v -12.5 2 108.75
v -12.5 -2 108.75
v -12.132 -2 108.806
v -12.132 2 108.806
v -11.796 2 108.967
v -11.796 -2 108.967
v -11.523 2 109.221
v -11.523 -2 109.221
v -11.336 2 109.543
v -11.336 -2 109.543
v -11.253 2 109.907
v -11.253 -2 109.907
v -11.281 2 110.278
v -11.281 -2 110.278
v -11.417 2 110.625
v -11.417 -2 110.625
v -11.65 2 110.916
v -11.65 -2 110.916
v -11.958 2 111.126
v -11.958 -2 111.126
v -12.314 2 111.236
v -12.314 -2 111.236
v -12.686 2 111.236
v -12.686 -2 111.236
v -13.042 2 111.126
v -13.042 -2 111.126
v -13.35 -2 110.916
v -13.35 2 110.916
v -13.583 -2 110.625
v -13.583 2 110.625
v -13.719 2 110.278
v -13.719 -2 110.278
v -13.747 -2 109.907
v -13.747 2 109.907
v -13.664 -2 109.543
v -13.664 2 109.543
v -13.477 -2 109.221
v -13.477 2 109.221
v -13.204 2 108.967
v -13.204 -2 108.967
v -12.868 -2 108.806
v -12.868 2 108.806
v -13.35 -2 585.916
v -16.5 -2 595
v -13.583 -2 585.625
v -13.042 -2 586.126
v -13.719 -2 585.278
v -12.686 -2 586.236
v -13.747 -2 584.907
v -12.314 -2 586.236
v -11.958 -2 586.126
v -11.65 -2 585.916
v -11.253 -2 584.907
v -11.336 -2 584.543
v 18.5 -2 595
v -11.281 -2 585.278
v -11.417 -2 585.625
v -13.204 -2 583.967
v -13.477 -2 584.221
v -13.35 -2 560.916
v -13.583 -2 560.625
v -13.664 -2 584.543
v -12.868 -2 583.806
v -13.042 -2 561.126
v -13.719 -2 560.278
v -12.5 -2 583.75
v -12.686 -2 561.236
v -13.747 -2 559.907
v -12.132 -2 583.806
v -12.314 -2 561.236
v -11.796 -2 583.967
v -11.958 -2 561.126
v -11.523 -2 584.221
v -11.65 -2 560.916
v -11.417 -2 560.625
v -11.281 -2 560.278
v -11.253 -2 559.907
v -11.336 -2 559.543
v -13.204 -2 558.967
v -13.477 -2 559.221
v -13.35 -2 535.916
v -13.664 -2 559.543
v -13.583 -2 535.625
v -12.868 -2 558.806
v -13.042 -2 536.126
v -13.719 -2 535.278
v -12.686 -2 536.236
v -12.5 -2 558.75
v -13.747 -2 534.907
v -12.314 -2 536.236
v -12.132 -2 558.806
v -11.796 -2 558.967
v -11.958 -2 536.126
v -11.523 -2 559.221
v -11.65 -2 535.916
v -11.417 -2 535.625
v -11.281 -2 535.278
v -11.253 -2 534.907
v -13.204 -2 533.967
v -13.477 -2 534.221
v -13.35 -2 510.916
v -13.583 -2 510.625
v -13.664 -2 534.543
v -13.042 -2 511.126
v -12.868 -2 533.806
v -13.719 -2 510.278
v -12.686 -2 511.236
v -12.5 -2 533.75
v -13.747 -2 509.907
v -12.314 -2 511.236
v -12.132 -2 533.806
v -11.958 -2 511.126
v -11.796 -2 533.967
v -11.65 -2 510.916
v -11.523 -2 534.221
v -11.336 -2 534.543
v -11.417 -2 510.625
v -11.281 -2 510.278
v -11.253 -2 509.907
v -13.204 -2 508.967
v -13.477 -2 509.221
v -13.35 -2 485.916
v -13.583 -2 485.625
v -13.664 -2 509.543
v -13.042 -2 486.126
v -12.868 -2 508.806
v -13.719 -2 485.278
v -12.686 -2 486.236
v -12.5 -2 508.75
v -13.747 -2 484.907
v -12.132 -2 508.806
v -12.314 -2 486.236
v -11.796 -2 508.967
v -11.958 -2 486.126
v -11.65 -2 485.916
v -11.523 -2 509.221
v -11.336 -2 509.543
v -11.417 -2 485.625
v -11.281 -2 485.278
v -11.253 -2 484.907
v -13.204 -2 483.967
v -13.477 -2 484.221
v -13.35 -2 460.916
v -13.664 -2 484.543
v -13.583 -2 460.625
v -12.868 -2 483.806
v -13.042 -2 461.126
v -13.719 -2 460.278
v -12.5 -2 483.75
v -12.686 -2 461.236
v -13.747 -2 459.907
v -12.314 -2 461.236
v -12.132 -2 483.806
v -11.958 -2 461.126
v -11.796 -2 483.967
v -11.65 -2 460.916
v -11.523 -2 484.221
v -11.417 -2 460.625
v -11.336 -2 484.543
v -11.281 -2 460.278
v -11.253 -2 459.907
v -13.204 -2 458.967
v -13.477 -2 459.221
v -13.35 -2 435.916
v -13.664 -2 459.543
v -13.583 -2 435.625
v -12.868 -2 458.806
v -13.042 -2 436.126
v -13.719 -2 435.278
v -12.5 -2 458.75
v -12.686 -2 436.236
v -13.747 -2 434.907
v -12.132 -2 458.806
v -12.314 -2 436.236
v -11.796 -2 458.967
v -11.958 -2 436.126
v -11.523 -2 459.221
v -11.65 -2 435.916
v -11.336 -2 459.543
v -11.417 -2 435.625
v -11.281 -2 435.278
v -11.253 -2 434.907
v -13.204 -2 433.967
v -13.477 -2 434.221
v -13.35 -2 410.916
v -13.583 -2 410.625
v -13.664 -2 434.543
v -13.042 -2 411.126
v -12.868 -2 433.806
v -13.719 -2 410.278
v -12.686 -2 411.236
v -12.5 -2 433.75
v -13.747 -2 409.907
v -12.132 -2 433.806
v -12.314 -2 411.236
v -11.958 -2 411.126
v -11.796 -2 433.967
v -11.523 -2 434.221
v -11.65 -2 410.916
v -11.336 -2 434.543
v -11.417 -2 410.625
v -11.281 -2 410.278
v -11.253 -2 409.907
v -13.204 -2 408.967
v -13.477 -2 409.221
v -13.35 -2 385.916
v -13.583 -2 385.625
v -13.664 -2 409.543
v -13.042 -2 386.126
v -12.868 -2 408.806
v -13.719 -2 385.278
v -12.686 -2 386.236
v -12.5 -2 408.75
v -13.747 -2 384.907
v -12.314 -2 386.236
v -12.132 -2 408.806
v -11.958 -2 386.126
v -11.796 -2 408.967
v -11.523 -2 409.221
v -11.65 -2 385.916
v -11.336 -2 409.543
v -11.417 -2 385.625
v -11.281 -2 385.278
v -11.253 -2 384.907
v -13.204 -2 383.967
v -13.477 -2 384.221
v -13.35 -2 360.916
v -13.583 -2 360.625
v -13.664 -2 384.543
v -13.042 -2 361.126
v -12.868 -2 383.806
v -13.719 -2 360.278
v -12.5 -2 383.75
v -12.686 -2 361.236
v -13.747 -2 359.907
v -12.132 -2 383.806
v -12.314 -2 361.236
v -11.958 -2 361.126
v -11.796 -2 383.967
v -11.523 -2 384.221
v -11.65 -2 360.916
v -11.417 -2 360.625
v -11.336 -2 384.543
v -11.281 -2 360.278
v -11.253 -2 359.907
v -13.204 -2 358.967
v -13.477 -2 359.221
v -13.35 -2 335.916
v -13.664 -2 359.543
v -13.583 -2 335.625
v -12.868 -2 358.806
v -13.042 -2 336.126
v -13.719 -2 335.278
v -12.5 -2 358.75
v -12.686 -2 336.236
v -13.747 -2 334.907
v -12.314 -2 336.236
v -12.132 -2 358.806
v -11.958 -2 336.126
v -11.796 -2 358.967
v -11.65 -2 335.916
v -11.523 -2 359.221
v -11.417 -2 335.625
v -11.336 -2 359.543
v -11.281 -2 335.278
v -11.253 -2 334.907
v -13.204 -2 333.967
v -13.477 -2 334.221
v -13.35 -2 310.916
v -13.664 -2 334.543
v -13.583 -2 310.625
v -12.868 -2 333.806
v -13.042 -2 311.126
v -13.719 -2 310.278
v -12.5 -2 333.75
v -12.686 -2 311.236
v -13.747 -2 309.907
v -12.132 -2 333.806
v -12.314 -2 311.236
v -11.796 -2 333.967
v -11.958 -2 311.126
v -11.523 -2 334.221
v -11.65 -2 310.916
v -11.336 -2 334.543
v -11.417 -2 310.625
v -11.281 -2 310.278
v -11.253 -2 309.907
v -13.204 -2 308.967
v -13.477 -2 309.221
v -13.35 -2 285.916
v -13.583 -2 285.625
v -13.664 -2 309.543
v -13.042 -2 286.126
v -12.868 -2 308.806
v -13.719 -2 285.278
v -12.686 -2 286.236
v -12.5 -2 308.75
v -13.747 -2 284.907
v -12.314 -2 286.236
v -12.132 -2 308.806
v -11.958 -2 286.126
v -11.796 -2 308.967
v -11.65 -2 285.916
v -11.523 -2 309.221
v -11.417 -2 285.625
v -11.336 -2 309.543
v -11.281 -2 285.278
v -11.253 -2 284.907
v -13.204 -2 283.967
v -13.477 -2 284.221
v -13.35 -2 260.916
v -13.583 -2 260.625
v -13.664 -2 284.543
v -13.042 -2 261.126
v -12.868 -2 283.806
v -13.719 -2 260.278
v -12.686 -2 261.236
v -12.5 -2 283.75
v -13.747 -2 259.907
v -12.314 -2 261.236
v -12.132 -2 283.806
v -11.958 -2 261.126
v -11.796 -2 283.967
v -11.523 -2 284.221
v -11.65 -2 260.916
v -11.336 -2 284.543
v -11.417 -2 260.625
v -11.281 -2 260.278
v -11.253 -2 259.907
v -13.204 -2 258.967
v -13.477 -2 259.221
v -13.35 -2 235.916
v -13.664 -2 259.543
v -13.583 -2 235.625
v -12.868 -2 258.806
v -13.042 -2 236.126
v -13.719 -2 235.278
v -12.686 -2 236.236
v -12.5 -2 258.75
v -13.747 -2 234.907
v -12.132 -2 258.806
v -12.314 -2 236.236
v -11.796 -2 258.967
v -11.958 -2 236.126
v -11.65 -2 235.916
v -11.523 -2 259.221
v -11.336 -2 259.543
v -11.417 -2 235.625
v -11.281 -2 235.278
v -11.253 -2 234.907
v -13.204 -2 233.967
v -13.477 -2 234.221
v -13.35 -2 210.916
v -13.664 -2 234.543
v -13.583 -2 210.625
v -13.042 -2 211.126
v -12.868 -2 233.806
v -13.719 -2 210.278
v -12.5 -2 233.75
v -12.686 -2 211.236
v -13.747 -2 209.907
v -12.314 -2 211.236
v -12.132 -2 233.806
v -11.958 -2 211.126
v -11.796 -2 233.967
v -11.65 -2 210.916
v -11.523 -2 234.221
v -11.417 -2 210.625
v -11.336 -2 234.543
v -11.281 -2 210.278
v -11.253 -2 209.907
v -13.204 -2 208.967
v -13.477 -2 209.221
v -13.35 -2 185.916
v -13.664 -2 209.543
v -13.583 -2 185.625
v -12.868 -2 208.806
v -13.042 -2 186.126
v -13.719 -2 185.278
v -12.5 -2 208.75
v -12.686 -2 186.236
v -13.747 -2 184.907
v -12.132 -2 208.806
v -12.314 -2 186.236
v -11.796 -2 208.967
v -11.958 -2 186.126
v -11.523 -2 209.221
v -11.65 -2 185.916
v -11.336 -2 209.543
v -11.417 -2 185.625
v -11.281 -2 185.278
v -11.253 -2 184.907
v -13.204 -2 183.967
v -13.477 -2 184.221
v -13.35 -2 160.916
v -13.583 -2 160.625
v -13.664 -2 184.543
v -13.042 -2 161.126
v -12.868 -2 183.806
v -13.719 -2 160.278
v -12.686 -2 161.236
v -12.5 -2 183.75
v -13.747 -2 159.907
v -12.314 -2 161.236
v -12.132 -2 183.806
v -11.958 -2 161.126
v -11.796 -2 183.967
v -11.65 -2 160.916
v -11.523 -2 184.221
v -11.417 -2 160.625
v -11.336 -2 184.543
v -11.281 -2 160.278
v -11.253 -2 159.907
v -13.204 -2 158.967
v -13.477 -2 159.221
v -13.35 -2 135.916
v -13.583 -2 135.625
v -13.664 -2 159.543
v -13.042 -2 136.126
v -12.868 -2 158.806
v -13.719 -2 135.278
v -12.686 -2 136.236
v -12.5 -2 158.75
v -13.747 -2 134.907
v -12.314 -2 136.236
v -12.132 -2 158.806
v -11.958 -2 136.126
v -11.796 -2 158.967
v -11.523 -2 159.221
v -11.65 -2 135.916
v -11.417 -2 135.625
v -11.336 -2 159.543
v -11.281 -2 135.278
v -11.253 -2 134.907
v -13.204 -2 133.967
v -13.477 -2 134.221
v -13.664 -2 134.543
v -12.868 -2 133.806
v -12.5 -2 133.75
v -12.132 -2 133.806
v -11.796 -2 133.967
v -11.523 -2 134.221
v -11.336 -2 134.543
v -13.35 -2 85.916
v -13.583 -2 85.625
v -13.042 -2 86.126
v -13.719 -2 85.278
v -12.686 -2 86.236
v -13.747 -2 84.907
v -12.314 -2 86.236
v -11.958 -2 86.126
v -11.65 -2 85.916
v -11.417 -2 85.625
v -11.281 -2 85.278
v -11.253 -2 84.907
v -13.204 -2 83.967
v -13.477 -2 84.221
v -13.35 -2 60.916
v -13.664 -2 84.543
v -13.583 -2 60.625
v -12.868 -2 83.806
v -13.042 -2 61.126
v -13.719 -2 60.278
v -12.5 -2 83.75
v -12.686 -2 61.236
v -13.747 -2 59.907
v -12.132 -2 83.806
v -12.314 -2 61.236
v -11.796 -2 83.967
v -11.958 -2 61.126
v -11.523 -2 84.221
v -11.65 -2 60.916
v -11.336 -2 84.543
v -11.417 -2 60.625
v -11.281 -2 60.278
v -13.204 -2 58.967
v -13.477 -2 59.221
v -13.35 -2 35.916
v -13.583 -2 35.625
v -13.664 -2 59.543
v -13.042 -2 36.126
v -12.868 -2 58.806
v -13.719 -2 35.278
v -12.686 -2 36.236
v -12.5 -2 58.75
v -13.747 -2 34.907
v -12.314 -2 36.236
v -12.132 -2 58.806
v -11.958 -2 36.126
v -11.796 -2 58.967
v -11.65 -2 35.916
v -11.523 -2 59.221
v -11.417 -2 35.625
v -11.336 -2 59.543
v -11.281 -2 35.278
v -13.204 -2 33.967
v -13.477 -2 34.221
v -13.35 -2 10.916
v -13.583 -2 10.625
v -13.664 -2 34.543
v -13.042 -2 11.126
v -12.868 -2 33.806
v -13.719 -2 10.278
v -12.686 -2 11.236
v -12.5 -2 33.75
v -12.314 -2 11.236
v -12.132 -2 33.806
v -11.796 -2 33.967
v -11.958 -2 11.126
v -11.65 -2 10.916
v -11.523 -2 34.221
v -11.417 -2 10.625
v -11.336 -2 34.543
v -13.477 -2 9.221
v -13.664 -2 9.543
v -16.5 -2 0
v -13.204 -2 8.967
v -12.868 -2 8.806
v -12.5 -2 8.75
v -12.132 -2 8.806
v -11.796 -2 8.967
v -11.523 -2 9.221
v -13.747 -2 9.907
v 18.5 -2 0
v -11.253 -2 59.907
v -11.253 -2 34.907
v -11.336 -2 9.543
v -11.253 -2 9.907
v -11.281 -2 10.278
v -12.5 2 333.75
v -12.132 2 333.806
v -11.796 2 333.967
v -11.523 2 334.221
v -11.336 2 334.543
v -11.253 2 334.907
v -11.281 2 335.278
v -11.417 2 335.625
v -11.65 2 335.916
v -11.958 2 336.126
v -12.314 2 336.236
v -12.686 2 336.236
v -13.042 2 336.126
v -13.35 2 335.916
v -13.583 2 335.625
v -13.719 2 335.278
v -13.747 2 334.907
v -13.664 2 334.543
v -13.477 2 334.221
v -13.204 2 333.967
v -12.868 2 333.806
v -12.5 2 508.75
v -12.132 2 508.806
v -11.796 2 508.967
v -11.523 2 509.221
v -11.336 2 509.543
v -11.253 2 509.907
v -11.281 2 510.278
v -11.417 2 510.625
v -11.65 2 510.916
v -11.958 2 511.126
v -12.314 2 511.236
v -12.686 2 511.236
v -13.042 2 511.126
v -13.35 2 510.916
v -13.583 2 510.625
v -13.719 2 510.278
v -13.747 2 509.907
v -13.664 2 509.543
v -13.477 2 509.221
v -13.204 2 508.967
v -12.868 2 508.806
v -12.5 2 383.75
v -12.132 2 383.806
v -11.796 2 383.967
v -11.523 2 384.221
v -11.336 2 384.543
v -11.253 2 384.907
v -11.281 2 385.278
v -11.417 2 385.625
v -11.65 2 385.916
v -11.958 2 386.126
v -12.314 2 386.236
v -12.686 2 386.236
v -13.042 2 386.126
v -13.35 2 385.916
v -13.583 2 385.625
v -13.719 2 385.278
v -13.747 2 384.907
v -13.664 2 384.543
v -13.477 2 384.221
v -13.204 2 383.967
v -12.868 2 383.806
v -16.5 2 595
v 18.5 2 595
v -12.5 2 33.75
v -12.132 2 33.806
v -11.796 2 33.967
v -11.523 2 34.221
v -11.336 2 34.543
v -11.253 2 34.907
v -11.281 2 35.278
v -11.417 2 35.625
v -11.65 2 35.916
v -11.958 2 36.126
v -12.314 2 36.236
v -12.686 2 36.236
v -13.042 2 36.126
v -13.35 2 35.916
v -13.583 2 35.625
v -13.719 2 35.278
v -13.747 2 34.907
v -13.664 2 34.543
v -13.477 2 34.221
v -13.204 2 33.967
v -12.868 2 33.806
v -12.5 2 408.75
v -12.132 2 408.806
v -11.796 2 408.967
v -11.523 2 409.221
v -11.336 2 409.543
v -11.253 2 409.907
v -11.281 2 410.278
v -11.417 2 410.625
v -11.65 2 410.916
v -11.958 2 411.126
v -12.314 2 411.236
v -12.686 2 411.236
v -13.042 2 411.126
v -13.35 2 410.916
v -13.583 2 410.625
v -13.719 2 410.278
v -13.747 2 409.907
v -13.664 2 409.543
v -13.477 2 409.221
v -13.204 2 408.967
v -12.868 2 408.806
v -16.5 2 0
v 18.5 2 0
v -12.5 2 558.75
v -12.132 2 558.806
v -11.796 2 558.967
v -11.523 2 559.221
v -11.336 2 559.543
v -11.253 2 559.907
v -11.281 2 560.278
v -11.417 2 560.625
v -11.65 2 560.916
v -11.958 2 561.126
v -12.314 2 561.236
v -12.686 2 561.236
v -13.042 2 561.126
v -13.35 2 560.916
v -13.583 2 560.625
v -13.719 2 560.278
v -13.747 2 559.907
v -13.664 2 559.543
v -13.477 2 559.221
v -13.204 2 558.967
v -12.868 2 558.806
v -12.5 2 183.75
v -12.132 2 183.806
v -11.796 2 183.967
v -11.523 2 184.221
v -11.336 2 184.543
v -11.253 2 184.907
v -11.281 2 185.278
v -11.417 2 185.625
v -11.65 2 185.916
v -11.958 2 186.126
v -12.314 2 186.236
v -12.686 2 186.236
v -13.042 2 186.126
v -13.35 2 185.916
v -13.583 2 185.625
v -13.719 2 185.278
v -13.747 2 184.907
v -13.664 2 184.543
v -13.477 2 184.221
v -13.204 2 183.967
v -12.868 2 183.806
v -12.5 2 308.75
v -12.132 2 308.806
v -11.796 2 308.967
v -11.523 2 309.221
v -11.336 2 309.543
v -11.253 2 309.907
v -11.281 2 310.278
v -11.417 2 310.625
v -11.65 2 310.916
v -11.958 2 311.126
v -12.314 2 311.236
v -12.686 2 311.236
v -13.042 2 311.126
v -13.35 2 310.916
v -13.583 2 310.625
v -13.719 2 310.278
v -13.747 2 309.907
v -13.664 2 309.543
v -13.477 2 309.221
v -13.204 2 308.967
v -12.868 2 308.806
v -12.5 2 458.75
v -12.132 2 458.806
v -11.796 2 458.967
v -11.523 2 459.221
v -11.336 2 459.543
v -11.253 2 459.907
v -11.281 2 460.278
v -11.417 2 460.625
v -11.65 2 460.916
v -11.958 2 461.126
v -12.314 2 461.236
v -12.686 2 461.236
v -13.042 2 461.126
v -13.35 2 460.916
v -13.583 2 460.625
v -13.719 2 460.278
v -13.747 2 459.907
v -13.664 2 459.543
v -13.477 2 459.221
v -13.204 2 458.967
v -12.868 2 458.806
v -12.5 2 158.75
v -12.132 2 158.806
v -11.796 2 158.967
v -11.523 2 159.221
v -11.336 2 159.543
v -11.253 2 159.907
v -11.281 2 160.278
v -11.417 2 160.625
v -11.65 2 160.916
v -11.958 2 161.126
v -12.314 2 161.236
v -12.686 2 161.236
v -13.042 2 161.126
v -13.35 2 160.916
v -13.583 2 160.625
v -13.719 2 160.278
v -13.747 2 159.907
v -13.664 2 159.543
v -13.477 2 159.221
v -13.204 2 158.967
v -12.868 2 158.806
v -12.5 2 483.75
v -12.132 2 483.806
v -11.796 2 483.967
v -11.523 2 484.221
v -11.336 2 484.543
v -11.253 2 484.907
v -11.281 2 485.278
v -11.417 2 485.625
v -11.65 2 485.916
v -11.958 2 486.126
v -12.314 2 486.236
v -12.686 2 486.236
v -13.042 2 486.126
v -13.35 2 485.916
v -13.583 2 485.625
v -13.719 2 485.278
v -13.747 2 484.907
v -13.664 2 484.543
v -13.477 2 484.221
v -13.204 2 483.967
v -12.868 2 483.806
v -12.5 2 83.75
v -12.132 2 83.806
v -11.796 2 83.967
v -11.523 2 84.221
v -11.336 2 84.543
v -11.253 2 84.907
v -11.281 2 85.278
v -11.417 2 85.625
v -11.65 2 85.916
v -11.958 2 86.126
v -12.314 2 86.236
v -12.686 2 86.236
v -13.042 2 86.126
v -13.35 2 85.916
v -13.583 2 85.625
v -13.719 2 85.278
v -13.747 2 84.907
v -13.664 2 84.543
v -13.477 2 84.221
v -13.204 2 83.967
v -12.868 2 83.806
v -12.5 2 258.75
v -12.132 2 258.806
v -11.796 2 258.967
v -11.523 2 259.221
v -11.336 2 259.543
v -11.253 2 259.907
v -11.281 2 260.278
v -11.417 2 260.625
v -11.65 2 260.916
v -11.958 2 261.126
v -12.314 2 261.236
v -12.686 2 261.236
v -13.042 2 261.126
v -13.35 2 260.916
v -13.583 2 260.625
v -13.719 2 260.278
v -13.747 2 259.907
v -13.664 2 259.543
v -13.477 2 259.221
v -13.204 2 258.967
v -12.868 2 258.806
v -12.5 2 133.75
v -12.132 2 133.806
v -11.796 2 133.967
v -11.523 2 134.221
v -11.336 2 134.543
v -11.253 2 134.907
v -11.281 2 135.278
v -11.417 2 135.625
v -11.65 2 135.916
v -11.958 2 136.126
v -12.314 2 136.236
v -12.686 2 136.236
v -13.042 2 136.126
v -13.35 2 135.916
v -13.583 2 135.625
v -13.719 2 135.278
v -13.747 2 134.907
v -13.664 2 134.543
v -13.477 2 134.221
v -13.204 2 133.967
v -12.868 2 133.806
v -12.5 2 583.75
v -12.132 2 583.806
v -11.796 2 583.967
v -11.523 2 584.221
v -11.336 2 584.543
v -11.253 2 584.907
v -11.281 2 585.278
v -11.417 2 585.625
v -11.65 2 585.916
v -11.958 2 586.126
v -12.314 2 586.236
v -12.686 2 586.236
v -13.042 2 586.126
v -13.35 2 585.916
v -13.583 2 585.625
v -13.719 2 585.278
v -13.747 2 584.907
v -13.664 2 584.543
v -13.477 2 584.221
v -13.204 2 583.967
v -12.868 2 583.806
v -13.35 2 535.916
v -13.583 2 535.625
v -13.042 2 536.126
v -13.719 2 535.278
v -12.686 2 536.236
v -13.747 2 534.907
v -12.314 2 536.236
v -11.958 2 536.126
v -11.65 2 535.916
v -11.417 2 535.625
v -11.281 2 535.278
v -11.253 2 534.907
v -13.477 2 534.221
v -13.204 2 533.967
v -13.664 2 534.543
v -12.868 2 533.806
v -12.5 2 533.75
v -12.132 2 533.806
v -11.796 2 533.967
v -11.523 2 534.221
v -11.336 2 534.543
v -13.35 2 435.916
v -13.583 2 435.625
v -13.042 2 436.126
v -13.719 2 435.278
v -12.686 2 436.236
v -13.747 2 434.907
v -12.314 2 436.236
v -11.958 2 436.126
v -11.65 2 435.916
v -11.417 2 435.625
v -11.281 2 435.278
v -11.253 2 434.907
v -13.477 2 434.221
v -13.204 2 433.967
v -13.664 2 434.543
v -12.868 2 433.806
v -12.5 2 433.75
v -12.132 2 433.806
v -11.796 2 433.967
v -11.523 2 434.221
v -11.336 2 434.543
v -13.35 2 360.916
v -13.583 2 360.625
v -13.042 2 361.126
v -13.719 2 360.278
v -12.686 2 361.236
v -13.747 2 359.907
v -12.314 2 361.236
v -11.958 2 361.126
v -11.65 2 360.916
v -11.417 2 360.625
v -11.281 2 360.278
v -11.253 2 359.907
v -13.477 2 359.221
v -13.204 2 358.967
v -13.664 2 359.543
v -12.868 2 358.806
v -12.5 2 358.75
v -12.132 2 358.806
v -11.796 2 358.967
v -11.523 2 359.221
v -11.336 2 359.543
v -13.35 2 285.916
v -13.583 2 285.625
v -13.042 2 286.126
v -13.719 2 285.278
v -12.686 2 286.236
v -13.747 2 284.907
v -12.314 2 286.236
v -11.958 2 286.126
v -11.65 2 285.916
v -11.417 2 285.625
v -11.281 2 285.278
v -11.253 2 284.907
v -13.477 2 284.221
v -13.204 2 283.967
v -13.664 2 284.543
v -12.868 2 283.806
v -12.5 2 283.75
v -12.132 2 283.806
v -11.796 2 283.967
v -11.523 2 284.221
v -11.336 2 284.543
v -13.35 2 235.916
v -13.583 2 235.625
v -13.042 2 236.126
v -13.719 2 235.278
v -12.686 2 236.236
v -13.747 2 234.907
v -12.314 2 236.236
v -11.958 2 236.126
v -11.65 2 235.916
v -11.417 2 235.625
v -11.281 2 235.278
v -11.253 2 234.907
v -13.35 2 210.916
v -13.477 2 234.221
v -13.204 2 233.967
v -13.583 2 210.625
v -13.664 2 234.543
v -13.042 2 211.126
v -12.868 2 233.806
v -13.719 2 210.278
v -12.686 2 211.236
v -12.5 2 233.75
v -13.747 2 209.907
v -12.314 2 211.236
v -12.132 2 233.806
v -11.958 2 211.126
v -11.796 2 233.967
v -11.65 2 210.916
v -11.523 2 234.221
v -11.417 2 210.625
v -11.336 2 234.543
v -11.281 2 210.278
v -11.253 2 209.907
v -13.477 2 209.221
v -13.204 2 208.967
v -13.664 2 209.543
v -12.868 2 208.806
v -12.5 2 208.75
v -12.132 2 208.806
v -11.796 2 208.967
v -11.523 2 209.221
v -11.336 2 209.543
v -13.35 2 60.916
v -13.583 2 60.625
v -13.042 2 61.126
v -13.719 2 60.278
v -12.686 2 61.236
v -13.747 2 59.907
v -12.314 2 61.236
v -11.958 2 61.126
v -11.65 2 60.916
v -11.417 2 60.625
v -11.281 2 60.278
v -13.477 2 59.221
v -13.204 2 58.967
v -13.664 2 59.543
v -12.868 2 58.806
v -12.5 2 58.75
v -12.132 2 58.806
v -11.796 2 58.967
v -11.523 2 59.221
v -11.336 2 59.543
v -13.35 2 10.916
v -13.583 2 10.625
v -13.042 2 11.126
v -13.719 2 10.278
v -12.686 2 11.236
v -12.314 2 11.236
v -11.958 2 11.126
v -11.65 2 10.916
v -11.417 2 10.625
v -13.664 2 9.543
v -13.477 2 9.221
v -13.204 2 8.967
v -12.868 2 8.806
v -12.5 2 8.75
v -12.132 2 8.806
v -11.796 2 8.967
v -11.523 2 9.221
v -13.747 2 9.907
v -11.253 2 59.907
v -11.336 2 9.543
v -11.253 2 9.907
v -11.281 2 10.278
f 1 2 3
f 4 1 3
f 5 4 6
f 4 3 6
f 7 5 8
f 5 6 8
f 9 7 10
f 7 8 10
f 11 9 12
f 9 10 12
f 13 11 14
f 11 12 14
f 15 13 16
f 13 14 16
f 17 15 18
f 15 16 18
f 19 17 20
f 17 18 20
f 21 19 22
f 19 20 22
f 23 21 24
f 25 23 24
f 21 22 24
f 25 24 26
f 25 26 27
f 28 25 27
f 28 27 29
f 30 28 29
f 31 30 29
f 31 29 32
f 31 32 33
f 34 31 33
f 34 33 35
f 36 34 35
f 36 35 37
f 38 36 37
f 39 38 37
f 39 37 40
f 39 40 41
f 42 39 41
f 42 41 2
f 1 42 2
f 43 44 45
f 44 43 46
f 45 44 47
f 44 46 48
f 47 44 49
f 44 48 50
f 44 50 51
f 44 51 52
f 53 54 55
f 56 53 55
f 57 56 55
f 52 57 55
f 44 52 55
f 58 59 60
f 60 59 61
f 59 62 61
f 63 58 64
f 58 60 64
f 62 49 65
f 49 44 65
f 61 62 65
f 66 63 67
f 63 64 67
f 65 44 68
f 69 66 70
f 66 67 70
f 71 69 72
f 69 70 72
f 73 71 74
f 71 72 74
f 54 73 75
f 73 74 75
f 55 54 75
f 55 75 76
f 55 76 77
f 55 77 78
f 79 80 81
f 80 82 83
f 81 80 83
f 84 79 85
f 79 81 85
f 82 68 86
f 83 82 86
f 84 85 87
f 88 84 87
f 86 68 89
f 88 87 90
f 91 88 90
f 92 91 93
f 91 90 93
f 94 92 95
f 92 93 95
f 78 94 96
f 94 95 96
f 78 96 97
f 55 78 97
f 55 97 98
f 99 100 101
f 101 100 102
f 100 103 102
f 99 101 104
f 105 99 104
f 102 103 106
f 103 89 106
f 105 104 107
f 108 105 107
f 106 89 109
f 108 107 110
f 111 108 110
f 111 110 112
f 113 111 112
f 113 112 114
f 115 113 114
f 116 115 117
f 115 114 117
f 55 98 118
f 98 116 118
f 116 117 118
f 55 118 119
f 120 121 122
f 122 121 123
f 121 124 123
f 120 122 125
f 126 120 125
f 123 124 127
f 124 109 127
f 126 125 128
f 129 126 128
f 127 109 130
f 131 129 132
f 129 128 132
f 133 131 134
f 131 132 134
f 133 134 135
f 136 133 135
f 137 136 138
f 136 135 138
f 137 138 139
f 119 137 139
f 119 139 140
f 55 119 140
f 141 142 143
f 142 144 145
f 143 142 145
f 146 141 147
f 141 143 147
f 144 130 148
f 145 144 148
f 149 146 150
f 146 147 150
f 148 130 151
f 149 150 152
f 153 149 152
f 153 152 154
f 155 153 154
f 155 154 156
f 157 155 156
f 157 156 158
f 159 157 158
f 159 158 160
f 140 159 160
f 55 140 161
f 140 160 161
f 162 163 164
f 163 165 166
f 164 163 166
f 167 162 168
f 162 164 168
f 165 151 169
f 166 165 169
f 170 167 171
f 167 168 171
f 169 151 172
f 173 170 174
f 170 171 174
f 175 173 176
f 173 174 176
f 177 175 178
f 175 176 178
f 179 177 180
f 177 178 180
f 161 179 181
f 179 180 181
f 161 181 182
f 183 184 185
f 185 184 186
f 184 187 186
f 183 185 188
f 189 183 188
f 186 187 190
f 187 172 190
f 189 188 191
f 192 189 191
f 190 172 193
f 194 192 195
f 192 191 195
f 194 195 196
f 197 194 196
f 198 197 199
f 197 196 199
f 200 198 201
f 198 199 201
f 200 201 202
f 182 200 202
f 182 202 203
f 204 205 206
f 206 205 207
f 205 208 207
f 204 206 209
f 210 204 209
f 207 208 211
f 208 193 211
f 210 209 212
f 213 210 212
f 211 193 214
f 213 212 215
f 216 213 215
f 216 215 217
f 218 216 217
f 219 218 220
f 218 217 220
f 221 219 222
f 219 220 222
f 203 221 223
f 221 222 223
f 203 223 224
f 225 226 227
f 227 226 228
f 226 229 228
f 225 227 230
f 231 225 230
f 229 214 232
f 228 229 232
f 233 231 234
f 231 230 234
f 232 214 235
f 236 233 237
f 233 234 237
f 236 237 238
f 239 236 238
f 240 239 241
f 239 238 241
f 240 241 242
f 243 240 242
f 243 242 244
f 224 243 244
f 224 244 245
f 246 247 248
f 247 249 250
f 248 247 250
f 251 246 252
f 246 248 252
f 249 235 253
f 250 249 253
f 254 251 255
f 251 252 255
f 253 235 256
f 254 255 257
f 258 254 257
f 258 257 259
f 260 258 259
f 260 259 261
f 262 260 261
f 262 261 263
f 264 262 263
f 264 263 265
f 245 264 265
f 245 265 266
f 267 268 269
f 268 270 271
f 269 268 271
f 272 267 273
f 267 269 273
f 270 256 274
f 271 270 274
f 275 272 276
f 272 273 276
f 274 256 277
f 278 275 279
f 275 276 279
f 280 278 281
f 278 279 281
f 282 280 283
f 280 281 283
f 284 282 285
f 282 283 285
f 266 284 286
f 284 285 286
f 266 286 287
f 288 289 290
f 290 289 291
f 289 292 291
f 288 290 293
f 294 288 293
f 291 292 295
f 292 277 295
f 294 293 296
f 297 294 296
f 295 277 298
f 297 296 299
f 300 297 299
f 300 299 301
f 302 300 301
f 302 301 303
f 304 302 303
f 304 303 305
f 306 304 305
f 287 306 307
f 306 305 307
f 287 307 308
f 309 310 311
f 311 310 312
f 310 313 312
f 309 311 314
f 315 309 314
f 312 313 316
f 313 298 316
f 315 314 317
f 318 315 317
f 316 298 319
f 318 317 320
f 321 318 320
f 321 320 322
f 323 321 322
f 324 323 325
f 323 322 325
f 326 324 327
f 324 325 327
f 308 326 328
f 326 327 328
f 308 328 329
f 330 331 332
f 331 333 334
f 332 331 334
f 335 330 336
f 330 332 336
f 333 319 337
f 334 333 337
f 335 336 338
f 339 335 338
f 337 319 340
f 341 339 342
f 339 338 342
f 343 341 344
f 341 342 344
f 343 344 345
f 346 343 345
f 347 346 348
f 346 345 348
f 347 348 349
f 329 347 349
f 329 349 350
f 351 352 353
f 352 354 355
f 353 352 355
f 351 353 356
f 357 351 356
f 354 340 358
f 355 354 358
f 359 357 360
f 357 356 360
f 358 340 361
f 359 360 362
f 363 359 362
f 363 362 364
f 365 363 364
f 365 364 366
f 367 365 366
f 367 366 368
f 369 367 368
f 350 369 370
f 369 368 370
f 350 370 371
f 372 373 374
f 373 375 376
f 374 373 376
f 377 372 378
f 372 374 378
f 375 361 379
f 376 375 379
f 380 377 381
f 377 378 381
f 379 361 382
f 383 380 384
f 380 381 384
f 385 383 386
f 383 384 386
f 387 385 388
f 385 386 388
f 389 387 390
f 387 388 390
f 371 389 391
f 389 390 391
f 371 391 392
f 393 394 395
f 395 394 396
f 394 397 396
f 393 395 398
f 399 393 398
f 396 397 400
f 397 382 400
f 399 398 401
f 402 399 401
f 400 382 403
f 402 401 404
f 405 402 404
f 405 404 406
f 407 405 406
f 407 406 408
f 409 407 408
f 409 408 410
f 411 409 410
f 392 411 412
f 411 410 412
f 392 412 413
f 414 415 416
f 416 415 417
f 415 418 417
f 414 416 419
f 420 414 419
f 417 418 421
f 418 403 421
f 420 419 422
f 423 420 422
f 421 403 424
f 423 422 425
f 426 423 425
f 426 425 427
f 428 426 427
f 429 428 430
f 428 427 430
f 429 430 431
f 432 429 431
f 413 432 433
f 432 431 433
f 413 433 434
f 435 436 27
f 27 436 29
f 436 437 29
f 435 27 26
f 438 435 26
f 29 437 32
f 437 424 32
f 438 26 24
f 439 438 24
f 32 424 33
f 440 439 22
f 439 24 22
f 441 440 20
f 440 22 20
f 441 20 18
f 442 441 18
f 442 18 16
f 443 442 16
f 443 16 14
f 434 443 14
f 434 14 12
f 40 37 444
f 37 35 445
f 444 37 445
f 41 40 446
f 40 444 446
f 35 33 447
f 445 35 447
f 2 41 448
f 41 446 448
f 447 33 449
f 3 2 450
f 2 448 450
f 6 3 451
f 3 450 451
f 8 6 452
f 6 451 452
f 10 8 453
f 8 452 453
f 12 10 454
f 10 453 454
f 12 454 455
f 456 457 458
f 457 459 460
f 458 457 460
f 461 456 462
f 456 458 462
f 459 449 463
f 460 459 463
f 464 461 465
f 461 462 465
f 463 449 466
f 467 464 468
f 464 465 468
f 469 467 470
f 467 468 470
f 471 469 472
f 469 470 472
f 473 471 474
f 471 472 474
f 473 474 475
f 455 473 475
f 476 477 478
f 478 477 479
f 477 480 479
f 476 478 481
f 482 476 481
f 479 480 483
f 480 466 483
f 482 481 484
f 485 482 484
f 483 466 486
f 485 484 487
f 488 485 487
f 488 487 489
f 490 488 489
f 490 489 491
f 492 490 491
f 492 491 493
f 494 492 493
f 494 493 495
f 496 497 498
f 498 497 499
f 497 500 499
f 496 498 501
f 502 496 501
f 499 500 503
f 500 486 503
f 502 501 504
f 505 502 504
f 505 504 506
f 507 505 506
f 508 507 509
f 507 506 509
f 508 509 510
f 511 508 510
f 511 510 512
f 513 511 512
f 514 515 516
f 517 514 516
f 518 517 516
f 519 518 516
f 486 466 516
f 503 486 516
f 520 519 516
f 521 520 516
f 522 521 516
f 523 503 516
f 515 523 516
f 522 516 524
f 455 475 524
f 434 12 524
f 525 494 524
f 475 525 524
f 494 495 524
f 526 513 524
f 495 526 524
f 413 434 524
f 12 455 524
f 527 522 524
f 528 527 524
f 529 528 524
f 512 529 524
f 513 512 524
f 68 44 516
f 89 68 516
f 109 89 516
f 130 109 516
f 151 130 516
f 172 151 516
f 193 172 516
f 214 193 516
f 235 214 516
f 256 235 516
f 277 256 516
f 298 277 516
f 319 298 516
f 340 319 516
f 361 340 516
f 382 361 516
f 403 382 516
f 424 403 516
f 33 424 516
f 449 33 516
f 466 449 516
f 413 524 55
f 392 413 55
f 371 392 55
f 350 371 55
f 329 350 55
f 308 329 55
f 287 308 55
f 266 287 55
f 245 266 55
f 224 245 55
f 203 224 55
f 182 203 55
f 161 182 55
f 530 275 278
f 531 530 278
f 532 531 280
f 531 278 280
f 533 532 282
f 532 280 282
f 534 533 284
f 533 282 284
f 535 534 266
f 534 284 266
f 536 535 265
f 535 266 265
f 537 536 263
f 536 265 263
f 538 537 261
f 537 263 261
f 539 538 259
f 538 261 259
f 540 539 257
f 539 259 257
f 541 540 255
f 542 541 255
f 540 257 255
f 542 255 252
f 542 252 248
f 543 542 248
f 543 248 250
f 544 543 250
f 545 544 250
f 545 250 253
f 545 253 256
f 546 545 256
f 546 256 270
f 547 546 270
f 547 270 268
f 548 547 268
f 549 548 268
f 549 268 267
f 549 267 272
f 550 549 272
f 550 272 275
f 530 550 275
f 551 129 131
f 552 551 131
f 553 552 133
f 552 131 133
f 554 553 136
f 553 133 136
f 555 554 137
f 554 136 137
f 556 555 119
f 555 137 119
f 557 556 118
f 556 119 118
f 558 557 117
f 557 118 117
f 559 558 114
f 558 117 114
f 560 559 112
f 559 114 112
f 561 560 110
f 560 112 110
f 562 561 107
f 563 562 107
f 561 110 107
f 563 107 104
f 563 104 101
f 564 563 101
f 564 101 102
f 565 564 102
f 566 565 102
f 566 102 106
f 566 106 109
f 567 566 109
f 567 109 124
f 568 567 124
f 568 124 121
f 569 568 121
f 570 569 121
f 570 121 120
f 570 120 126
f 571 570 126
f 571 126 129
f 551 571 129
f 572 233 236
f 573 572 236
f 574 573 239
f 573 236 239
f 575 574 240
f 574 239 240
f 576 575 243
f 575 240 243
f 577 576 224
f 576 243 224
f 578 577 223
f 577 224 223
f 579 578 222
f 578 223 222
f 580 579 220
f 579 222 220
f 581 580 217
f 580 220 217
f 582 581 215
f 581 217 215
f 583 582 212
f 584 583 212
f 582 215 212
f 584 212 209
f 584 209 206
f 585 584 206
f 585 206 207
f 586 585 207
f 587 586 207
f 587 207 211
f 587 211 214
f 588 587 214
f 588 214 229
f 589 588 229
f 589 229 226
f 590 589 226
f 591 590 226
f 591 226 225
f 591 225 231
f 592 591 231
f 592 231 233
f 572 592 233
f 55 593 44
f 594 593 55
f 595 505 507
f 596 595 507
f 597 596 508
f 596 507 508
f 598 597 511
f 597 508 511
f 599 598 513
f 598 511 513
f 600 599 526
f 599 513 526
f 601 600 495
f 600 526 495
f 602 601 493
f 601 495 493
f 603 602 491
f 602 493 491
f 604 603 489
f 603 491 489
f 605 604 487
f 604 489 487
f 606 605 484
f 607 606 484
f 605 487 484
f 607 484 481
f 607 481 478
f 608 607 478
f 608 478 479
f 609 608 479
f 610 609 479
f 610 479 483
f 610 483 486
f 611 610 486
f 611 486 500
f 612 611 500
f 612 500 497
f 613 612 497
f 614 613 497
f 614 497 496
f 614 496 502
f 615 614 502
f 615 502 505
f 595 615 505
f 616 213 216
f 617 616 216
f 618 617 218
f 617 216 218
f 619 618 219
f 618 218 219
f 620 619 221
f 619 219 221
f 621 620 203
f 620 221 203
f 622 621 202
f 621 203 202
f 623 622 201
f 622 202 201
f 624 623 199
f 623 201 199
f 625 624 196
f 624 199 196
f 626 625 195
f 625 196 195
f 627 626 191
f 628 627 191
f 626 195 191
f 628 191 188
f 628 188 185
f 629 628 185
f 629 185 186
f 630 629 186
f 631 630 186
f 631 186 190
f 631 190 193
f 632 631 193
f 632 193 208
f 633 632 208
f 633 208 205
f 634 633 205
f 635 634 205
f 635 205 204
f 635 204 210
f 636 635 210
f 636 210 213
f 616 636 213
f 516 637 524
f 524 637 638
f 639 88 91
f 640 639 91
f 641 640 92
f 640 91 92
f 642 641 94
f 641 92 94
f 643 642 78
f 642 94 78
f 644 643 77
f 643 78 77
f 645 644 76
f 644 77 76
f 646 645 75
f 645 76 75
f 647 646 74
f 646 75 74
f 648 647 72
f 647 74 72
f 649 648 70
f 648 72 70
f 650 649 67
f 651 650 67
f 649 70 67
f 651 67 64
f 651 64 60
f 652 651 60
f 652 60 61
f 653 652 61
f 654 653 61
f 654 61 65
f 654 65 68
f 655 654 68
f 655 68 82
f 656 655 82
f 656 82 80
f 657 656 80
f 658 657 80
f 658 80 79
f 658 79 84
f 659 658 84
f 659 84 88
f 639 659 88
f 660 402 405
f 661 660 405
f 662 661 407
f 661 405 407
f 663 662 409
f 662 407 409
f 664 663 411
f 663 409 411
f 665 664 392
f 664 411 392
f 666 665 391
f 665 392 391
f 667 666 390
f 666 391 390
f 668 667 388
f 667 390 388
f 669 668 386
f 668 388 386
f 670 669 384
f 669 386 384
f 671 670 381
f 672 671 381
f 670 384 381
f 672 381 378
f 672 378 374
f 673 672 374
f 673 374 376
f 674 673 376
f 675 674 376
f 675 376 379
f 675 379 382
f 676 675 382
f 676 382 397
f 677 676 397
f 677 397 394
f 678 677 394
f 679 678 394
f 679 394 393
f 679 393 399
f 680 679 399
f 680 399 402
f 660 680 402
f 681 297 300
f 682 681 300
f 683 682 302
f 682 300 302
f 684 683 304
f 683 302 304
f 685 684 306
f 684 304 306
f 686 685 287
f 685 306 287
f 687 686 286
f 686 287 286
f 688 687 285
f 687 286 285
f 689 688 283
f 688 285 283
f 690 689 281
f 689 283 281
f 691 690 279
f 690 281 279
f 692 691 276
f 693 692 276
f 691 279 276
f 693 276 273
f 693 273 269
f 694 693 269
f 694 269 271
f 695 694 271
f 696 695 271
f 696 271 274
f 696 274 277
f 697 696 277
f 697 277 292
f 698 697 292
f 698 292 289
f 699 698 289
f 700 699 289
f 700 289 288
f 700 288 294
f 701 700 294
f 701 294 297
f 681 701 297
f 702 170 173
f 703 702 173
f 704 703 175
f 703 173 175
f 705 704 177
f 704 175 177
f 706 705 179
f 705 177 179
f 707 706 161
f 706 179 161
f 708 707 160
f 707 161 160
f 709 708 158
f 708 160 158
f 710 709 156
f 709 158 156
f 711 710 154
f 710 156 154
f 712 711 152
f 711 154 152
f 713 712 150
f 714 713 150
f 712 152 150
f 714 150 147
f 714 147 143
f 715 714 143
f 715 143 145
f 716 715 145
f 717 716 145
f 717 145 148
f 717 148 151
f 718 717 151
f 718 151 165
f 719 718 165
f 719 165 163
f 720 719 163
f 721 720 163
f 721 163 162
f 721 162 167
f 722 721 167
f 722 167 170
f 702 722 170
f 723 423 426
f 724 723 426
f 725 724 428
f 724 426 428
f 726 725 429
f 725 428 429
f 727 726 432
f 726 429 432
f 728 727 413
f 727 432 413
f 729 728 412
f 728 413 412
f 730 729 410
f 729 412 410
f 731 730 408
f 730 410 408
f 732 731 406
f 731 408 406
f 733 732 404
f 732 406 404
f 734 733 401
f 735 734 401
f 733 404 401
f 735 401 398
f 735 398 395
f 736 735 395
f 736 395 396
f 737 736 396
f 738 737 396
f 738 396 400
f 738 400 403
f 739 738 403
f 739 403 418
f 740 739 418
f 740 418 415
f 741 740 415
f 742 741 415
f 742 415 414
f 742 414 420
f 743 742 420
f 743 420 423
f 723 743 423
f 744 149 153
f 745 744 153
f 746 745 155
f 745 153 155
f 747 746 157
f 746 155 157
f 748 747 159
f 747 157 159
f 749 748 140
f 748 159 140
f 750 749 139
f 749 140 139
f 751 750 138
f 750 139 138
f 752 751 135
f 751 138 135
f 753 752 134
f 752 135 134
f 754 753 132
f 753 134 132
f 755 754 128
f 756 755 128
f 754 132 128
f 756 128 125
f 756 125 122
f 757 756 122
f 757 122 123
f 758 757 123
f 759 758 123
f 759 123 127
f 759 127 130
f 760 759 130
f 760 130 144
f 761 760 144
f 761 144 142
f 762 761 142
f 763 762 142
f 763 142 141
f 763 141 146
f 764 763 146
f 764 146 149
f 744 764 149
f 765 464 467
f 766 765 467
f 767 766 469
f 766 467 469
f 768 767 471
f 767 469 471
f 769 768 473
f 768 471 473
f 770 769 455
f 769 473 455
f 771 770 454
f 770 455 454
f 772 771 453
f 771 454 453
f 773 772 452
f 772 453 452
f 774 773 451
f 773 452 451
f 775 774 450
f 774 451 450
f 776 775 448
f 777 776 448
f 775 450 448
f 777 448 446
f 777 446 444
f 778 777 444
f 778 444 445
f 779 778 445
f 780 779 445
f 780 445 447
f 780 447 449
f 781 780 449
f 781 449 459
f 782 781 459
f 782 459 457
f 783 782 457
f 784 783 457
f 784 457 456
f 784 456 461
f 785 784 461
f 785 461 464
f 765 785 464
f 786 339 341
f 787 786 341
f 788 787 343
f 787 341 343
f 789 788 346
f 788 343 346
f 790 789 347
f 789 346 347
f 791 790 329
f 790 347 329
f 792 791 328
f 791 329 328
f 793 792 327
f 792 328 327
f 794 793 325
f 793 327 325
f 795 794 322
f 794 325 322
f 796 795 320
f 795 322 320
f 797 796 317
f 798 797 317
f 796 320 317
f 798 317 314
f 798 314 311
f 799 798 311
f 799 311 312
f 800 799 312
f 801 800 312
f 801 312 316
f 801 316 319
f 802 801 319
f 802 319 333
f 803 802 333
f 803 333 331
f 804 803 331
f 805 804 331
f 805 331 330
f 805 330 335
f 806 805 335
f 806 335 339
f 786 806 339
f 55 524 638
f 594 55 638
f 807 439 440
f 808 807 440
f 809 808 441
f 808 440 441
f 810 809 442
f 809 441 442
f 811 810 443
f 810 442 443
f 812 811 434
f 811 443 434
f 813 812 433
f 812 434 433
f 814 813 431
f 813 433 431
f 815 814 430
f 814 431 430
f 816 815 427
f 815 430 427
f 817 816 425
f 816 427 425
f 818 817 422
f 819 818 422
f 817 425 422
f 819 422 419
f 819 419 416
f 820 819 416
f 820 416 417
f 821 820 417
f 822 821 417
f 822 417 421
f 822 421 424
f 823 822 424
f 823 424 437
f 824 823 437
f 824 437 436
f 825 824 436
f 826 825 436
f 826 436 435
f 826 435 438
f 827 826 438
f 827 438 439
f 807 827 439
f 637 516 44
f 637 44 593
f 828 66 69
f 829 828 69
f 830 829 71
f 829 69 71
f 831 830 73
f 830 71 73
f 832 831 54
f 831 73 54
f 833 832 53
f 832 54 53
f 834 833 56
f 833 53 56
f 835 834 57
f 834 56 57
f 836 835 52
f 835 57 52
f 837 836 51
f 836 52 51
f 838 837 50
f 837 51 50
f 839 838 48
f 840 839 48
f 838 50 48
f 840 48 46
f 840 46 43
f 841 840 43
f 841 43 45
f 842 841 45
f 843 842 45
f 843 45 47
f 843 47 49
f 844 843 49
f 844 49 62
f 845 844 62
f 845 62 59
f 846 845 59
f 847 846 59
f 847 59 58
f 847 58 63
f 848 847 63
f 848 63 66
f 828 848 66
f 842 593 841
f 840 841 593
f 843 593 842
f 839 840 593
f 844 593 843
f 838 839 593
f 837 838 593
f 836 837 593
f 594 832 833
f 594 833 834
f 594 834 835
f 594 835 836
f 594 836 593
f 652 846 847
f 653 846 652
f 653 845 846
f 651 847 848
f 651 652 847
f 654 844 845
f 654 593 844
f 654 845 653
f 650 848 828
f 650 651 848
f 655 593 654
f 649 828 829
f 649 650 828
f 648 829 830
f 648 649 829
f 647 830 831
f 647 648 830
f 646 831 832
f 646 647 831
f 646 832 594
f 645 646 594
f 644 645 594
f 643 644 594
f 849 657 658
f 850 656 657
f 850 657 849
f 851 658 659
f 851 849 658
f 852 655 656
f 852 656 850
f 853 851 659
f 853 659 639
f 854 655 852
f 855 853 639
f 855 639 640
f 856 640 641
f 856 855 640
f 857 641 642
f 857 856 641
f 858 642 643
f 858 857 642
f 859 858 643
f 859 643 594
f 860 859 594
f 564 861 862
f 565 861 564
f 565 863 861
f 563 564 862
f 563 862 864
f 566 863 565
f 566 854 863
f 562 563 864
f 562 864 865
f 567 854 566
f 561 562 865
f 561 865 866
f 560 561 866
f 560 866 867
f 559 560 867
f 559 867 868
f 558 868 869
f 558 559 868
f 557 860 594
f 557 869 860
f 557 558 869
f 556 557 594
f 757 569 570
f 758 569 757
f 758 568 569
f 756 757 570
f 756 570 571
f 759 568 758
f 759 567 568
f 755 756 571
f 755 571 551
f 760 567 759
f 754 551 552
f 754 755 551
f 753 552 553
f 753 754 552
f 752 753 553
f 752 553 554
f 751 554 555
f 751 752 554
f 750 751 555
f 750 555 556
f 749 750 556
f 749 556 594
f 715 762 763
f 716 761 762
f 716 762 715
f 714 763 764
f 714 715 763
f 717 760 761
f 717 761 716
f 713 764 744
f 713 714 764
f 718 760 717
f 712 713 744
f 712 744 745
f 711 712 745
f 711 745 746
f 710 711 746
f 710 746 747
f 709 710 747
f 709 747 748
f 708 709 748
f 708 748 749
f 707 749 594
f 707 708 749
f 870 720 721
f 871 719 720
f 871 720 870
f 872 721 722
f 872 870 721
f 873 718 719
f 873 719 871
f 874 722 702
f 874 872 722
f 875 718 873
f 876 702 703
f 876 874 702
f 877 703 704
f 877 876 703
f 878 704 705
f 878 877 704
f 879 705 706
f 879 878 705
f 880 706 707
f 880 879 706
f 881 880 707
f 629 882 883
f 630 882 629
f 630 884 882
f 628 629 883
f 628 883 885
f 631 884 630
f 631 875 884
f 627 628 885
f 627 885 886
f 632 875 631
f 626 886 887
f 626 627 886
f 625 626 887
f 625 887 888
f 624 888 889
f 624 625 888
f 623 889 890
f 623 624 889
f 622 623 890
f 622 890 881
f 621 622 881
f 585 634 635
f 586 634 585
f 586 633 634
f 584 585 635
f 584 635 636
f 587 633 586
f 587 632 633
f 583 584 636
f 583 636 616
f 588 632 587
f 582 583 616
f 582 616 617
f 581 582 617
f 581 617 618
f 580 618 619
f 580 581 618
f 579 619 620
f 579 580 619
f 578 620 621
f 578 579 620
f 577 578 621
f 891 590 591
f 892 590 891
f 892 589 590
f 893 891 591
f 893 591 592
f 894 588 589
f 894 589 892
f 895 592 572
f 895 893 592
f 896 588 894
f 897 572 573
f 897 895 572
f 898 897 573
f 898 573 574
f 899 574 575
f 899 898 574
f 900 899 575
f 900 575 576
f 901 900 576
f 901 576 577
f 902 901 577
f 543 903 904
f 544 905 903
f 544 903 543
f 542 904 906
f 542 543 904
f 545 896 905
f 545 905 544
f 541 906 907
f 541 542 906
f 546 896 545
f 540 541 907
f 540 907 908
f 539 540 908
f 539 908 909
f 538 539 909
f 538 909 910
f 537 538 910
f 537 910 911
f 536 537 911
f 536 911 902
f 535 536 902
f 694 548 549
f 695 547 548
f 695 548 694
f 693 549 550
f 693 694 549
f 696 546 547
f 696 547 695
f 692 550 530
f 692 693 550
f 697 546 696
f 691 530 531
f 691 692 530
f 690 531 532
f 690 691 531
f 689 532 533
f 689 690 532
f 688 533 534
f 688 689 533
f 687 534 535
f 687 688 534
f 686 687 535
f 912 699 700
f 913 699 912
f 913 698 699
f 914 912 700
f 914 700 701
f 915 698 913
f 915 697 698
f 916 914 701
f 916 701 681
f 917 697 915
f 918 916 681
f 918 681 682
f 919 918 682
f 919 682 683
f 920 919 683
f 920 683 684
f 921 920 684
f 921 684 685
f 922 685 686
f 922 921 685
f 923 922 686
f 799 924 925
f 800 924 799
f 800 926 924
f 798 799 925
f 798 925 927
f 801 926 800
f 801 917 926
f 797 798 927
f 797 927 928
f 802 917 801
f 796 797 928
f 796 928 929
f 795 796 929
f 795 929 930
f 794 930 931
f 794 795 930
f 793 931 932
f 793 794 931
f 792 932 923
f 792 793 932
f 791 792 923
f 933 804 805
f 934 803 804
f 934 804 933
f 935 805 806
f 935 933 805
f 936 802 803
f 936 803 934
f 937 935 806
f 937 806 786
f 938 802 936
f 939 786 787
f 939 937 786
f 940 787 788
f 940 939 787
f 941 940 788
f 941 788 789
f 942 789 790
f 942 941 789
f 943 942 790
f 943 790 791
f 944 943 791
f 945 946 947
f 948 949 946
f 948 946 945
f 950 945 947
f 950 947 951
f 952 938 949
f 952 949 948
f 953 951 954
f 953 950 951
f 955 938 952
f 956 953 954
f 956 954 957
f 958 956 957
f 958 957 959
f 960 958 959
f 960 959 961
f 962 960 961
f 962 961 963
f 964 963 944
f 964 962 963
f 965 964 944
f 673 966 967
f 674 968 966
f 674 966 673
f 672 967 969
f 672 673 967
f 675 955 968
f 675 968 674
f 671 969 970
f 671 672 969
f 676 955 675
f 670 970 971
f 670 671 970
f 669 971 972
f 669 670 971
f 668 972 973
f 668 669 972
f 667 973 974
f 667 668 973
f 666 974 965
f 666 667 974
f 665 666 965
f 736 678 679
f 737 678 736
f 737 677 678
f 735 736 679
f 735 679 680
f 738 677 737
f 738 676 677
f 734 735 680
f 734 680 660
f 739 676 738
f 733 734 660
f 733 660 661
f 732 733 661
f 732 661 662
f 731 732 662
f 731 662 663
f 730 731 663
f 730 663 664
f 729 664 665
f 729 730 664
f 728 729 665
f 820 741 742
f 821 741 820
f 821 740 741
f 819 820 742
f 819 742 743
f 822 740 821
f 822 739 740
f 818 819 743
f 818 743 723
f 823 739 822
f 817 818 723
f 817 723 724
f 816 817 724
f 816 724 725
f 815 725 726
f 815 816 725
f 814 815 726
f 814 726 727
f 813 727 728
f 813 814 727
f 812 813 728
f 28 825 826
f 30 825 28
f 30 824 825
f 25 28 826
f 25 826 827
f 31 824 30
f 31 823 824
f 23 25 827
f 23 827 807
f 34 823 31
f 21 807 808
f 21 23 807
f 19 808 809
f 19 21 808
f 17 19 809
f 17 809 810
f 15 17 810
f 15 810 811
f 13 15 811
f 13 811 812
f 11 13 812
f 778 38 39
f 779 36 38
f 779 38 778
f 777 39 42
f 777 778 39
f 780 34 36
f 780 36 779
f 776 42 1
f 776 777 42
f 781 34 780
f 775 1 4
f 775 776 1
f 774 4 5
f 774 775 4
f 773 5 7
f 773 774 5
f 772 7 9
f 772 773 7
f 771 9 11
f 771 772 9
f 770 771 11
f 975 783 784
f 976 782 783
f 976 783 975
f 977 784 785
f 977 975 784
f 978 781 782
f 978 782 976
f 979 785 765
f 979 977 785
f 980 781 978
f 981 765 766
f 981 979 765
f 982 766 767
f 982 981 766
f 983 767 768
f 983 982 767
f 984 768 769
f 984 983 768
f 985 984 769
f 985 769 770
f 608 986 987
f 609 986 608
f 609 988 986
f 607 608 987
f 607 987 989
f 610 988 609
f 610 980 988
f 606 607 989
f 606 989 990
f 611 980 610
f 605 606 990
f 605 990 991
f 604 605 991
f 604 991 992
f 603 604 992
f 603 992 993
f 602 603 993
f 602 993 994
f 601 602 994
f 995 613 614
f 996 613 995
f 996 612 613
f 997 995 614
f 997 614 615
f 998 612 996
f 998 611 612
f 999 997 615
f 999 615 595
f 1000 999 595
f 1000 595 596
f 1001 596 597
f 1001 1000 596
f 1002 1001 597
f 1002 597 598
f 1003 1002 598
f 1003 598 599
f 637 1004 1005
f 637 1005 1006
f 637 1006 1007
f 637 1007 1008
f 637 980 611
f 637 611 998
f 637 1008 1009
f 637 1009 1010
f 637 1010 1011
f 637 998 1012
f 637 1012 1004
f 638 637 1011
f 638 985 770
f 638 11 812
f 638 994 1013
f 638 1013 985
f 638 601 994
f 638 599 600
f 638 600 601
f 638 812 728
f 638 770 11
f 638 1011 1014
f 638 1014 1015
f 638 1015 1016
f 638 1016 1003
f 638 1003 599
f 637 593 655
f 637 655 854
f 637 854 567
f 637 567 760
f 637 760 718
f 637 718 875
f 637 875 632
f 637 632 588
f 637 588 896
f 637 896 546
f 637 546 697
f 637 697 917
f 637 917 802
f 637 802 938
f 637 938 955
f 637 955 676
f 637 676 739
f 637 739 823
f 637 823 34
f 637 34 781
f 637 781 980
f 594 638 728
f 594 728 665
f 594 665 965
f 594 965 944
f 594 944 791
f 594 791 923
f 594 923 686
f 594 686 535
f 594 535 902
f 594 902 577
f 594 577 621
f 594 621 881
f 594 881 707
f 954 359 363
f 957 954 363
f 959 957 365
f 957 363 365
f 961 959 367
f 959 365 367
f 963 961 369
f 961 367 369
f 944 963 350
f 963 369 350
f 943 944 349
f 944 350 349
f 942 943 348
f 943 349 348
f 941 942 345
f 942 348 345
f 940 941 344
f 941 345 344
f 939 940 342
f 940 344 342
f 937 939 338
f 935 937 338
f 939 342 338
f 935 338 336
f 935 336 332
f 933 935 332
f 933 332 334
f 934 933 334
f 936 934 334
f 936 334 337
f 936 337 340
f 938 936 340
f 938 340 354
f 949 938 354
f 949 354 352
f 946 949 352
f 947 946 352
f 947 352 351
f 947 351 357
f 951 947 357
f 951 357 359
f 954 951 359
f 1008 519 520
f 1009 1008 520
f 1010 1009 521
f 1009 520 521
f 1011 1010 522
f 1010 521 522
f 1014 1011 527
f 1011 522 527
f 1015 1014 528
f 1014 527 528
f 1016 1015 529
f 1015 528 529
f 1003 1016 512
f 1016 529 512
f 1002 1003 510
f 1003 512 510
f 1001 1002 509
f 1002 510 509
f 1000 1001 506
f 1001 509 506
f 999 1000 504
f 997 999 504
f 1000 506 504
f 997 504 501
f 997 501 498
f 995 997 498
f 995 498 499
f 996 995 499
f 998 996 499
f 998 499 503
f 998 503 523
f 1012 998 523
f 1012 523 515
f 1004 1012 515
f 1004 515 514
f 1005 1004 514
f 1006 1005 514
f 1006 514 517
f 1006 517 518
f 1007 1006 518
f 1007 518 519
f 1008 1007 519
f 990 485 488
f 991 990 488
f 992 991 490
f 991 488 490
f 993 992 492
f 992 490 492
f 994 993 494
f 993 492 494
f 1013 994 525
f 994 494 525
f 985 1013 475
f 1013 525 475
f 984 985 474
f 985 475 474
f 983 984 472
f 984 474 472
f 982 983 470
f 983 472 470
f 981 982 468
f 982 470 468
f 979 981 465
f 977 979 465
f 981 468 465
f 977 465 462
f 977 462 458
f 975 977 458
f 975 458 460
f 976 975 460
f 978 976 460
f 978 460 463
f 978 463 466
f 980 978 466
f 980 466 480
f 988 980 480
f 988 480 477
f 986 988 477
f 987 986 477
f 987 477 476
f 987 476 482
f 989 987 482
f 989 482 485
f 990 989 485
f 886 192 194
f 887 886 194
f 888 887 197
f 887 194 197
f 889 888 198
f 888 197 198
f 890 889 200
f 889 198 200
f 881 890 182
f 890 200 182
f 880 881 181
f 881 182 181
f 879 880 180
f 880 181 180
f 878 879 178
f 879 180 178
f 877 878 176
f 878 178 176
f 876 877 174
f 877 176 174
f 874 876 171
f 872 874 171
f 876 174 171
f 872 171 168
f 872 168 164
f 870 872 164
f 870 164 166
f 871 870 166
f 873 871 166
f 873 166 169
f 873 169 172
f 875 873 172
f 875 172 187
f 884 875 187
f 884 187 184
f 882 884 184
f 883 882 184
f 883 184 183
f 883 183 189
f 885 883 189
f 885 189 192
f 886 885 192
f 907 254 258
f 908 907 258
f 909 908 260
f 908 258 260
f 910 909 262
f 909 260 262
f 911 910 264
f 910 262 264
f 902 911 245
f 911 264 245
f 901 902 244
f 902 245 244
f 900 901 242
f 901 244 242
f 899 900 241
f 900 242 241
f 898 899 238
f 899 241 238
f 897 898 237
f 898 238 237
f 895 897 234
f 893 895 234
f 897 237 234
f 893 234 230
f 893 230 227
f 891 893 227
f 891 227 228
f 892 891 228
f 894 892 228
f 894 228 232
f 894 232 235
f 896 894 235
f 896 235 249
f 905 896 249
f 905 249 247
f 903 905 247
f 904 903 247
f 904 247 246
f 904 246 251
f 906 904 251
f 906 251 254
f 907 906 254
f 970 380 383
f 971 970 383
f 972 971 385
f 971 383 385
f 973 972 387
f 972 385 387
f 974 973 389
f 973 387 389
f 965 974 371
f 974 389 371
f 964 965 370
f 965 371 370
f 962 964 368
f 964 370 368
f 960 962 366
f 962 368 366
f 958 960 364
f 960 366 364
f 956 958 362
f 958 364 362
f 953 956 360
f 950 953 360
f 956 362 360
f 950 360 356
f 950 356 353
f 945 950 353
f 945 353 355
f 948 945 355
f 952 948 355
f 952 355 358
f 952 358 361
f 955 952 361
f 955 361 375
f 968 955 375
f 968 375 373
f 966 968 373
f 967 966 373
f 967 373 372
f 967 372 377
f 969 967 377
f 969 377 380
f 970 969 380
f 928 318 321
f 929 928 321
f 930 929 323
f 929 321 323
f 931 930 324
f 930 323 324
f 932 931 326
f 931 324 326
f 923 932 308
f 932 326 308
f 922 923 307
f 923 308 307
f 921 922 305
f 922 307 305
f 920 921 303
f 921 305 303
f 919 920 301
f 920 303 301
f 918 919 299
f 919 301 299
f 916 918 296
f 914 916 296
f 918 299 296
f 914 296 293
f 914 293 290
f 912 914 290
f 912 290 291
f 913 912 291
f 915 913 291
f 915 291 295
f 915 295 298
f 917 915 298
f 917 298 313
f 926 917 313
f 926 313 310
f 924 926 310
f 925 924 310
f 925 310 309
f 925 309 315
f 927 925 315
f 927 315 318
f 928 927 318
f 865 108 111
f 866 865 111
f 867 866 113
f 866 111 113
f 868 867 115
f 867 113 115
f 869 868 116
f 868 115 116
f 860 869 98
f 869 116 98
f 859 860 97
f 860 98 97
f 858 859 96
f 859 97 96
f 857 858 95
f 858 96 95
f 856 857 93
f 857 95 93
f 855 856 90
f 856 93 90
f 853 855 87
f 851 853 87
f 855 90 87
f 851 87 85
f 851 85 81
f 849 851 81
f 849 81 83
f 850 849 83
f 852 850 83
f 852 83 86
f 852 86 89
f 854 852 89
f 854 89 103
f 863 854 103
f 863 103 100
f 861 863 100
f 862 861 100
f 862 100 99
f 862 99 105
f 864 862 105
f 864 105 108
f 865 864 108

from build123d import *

# Parameters (mm, degrees)
SKETCH1_W           = 35
SKETCH1_H           = 4
BOSS_EXTRUDE1_DEPTH = 595
M3_TAPPED_HOLE1_D   = 2.5
LPATTERN1_COUNT     = 24
LPATTERN1_PITCH     = 25


with BuildPart() as part:
    # Sketch1 → Boss-Extrude1 (new body)
    with BuildSketch(Plane.XY):
        with Locations((1, 0)):
            Rectangle(SKETCH1_W, SKETCH1_H)
    extrude(amount=BOSS_EXTRUDE1_DEPTH)

    # M3 Tapped Hole1 (through all)
    with Locations(Plane(origin=(-12.5, 2, 10), x_dir=(0, 0, 1), z_dir=(0, 1, 0))):
        with Locations((0, 0)):
            m3_tapped_hole1 = Hole(M3_TAPPED_HOLE1_D / 2)

    # LPattern1: M3 Tapped Hole1 ×24
    with Locations(*[(0, 0, i * LPATTERN1_PITCH) for i in range(1, LPATTERN1_COUNT)]):
        add(m3_tapped_hole1, mode=Mode.SUBTRACT)


solid = part.part
